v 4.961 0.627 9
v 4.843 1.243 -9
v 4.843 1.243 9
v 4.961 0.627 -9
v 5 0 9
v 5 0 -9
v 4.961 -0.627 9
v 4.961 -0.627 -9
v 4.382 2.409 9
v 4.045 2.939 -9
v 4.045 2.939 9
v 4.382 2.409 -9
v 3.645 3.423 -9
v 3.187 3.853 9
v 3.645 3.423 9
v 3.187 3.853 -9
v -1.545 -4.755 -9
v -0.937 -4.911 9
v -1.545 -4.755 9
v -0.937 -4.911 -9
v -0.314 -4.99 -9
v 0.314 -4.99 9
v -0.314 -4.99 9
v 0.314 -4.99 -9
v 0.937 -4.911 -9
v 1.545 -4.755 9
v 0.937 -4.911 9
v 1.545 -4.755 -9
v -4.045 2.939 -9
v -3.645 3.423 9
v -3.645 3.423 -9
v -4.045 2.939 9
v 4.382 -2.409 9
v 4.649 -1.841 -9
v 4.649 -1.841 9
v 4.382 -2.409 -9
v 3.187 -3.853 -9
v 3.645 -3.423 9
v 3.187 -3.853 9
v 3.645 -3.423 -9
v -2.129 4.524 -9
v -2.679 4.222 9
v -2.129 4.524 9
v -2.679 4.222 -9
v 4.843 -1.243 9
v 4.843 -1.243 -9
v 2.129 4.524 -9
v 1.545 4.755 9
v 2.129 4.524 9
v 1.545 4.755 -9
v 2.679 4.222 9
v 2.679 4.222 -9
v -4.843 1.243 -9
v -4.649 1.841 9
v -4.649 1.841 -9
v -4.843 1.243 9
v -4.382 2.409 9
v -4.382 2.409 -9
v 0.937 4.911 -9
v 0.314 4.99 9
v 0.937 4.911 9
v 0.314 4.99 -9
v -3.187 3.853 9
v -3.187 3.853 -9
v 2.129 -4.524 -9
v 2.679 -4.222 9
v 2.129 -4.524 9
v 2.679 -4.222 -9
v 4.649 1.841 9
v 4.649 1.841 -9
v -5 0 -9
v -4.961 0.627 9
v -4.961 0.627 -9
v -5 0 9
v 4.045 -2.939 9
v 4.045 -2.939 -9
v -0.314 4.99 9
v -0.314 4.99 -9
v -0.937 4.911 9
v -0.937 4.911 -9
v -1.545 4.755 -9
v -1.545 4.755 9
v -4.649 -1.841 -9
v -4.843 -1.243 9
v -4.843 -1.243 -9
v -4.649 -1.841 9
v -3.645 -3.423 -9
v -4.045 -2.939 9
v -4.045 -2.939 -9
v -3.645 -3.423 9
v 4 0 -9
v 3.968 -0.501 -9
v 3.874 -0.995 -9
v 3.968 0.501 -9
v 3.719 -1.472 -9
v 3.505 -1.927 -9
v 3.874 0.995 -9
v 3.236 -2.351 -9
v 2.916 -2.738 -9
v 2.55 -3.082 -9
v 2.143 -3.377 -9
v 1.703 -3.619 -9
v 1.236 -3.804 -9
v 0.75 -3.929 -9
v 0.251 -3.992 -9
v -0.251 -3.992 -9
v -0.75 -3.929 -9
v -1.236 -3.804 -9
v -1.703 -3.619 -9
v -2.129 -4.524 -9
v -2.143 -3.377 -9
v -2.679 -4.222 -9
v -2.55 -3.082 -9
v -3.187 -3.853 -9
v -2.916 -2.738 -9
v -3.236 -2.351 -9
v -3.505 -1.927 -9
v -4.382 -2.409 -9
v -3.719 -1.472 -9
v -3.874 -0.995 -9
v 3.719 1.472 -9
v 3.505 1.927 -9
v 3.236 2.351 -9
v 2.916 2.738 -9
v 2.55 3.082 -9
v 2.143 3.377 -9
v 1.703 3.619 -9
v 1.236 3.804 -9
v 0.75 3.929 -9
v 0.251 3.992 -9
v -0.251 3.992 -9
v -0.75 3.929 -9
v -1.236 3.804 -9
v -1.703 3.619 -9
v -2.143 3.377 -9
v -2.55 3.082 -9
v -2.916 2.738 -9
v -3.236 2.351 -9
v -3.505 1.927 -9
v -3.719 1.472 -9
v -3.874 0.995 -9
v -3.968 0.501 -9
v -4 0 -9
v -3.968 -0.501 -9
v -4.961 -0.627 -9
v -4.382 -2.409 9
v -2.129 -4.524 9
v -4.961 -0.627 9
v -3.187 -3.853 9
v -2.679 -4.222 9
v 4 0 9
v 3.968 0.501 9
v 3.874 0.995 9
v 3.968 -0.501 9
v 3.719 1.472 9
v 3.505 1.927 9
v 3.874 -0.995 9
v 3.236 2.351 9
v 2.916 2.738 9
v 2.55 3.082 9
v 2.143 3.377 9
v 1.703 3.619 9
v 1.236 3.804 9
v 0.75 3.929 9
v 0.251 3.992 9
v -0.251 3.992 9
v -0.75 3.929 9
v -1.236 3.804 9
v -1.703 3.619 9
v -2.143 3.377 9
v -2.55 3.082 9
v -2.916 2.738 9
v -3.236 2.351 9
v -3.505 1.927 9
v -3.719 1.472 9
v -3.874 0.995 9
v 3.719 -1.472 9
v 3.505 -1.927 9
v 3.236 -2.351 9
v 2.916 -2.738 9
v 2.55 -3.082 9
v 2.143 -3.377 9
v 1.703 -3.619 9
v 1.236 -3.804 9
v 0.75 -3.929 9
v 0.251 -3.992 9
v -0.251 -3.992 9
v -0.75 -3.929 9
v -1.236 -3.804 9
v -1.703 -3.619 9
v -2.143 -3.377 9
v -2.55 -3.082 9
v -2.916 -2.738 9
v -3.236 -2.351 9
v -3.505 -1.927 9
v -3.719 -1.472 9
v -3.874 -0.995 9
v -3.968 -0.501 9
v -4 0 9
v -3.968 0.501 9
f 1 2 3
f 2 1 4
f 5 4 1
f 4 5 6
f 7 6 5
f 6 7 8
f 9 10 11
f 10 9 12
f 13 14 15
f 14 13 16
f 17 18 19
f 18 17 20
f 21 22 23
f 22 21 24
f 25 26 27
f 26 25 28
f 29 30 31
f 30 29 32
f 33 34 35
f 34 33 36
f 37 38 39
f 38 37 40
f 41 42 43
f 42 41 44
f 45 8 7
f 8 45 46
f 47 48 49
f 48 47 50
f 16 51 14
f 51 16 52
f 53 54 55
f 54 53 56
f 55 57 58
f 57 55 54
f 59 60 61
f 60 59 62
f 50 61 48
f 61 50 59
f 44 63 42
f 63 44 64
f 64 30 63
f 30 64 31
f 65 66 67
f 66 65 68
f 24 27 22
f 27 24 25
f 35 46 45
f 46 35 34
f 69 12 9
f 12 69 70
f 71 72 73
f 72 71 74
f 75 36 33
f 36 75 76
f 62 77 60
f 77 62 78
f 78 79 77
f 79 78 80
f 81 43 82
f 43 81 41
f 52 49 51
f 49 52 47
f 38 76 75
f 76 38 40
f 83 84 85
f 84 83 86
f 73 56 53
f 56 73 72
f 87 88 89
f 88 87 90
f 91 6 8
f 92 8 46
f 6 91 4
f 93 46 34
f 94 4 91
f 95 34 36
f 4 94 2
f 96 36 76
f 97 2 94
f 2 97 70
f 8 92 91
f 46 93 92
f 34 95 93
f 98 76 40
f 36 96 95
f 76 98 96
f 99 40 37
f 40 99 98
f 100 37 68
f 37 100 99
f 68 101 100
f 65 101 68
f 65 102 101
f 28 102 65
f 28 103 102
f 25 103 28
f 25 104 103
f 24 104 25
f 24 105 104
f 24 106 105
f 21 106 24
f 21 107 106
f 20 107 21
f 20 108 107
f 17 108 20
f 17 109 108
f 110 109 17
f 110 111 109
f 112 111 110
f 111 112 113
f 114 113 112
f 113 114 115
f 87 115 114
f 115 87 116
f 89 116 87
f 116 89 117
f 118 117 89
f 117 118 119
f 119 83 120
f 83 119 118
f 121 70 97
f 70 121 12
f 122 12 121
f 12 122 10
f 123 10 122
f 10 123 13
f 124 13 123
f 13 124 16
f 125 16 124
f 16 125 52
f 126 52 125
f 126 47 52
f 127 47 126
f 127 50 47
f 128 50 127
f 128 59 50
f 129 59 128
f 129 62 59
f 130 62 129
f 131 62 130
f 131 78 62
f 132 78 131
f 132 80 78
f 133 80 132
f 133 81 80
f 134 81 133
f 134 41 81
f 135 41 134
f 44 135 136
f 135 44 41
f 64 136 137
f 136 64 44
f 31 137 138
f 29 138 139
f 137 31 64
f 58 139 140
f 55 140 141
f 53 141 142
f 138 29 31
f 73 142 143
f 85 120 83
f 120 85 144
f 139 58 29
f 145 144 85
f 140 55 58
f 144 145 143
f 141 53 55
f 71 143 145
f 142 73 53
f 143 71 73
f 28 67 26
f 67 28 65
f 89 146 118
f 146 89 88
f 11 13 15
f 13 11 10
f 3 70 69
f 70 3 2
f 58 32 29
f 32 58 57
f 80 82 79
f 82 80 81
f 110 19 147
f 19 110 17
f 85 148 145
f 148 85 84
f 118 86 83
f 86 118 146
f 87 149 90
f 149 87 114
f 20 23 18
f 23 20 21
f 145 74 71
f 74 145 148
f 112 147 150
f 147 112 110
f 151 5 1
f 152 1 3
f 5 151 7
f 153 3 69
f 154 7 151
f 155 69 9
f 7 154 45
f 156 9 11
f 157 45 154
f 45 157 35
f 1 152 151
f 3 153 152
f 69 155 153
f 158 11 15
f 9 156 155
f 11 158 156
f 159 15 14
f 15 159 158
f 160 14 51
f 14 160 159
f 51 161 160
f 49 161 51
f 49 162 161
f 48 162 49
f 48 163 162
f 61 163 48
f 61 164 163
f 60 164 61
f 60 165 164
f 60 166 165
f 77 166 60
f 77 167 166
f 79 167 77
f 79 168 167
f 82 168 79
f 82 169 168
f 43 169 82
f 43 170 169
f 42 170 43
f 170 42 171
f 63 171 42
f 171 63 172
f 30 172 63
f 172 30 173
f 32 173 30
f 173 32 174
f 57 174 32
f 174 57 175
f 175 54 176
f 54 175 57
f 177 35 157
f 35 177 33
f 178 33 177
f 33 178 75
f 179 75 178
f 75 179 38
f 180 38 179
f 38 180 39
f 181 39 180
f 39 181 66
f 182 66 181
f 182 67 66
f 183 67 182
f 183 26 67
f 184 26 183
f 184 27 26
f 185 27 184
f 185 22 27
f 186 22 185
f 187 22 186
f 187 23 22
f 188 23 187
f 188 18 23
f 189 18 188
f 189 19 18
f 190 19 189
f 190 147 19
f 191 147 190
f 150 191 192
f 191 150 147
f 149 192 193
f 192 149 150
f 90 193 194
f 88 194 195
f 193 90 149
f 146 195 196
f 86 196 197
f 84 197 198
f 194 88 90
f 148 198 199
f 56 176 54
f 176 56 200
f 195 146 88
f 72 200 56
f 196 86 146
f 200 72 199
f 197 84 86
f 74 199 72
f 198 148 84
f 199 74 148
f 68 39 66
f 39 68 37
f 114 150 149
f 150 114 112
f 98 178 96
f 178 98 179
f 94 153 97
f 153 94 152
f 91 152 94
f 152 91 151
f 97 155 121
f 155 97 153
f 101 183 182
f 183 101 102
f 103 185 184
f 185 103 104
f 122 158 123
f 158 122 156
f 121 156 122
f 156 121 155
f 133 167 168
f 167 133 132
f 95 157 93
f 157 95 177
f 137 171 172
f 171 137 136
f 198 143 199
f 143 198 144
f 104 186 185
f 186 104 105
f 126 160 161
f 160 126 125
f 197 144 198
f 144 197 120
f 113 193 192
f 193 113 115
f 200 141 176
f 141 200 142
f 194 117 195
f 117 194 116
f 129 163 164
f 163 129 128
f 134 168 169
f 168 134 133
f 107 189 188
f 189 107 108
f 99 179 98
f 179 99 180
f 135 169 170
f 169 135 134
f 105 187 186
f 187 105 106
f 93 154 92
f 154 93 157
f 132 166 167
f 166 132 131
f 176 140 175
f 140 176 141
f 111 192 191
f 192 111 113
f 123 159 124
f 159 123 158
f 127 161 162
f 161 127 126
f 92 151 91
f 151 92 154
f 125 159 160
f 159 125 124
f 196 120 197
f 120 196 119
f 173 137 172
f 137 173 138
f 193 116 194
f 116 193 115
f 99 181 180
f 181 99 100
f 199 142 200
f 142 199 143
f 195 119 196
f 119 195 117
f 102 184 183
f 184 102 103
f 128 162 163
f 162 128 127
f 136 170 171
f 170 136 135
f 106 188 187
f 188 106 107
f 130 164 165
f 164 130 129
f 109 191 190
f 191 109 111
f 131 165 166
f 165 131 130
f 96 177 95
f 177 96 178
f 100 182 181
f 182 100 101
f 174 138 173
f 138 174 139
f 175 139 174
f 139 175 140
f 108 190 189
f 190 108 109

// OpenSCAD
$fn = 50;


difference() {
	union() {
		translate(v = [0, 0, -9.0000000000]) {
			cylinder(h = 18, r = 5.0000000000);
		}
	}
	union() {
		translate(v = [0, 0, -100.0000000000]) {
			cylinder(h = 200, r = 4.0000000000);
		}
	}
}
